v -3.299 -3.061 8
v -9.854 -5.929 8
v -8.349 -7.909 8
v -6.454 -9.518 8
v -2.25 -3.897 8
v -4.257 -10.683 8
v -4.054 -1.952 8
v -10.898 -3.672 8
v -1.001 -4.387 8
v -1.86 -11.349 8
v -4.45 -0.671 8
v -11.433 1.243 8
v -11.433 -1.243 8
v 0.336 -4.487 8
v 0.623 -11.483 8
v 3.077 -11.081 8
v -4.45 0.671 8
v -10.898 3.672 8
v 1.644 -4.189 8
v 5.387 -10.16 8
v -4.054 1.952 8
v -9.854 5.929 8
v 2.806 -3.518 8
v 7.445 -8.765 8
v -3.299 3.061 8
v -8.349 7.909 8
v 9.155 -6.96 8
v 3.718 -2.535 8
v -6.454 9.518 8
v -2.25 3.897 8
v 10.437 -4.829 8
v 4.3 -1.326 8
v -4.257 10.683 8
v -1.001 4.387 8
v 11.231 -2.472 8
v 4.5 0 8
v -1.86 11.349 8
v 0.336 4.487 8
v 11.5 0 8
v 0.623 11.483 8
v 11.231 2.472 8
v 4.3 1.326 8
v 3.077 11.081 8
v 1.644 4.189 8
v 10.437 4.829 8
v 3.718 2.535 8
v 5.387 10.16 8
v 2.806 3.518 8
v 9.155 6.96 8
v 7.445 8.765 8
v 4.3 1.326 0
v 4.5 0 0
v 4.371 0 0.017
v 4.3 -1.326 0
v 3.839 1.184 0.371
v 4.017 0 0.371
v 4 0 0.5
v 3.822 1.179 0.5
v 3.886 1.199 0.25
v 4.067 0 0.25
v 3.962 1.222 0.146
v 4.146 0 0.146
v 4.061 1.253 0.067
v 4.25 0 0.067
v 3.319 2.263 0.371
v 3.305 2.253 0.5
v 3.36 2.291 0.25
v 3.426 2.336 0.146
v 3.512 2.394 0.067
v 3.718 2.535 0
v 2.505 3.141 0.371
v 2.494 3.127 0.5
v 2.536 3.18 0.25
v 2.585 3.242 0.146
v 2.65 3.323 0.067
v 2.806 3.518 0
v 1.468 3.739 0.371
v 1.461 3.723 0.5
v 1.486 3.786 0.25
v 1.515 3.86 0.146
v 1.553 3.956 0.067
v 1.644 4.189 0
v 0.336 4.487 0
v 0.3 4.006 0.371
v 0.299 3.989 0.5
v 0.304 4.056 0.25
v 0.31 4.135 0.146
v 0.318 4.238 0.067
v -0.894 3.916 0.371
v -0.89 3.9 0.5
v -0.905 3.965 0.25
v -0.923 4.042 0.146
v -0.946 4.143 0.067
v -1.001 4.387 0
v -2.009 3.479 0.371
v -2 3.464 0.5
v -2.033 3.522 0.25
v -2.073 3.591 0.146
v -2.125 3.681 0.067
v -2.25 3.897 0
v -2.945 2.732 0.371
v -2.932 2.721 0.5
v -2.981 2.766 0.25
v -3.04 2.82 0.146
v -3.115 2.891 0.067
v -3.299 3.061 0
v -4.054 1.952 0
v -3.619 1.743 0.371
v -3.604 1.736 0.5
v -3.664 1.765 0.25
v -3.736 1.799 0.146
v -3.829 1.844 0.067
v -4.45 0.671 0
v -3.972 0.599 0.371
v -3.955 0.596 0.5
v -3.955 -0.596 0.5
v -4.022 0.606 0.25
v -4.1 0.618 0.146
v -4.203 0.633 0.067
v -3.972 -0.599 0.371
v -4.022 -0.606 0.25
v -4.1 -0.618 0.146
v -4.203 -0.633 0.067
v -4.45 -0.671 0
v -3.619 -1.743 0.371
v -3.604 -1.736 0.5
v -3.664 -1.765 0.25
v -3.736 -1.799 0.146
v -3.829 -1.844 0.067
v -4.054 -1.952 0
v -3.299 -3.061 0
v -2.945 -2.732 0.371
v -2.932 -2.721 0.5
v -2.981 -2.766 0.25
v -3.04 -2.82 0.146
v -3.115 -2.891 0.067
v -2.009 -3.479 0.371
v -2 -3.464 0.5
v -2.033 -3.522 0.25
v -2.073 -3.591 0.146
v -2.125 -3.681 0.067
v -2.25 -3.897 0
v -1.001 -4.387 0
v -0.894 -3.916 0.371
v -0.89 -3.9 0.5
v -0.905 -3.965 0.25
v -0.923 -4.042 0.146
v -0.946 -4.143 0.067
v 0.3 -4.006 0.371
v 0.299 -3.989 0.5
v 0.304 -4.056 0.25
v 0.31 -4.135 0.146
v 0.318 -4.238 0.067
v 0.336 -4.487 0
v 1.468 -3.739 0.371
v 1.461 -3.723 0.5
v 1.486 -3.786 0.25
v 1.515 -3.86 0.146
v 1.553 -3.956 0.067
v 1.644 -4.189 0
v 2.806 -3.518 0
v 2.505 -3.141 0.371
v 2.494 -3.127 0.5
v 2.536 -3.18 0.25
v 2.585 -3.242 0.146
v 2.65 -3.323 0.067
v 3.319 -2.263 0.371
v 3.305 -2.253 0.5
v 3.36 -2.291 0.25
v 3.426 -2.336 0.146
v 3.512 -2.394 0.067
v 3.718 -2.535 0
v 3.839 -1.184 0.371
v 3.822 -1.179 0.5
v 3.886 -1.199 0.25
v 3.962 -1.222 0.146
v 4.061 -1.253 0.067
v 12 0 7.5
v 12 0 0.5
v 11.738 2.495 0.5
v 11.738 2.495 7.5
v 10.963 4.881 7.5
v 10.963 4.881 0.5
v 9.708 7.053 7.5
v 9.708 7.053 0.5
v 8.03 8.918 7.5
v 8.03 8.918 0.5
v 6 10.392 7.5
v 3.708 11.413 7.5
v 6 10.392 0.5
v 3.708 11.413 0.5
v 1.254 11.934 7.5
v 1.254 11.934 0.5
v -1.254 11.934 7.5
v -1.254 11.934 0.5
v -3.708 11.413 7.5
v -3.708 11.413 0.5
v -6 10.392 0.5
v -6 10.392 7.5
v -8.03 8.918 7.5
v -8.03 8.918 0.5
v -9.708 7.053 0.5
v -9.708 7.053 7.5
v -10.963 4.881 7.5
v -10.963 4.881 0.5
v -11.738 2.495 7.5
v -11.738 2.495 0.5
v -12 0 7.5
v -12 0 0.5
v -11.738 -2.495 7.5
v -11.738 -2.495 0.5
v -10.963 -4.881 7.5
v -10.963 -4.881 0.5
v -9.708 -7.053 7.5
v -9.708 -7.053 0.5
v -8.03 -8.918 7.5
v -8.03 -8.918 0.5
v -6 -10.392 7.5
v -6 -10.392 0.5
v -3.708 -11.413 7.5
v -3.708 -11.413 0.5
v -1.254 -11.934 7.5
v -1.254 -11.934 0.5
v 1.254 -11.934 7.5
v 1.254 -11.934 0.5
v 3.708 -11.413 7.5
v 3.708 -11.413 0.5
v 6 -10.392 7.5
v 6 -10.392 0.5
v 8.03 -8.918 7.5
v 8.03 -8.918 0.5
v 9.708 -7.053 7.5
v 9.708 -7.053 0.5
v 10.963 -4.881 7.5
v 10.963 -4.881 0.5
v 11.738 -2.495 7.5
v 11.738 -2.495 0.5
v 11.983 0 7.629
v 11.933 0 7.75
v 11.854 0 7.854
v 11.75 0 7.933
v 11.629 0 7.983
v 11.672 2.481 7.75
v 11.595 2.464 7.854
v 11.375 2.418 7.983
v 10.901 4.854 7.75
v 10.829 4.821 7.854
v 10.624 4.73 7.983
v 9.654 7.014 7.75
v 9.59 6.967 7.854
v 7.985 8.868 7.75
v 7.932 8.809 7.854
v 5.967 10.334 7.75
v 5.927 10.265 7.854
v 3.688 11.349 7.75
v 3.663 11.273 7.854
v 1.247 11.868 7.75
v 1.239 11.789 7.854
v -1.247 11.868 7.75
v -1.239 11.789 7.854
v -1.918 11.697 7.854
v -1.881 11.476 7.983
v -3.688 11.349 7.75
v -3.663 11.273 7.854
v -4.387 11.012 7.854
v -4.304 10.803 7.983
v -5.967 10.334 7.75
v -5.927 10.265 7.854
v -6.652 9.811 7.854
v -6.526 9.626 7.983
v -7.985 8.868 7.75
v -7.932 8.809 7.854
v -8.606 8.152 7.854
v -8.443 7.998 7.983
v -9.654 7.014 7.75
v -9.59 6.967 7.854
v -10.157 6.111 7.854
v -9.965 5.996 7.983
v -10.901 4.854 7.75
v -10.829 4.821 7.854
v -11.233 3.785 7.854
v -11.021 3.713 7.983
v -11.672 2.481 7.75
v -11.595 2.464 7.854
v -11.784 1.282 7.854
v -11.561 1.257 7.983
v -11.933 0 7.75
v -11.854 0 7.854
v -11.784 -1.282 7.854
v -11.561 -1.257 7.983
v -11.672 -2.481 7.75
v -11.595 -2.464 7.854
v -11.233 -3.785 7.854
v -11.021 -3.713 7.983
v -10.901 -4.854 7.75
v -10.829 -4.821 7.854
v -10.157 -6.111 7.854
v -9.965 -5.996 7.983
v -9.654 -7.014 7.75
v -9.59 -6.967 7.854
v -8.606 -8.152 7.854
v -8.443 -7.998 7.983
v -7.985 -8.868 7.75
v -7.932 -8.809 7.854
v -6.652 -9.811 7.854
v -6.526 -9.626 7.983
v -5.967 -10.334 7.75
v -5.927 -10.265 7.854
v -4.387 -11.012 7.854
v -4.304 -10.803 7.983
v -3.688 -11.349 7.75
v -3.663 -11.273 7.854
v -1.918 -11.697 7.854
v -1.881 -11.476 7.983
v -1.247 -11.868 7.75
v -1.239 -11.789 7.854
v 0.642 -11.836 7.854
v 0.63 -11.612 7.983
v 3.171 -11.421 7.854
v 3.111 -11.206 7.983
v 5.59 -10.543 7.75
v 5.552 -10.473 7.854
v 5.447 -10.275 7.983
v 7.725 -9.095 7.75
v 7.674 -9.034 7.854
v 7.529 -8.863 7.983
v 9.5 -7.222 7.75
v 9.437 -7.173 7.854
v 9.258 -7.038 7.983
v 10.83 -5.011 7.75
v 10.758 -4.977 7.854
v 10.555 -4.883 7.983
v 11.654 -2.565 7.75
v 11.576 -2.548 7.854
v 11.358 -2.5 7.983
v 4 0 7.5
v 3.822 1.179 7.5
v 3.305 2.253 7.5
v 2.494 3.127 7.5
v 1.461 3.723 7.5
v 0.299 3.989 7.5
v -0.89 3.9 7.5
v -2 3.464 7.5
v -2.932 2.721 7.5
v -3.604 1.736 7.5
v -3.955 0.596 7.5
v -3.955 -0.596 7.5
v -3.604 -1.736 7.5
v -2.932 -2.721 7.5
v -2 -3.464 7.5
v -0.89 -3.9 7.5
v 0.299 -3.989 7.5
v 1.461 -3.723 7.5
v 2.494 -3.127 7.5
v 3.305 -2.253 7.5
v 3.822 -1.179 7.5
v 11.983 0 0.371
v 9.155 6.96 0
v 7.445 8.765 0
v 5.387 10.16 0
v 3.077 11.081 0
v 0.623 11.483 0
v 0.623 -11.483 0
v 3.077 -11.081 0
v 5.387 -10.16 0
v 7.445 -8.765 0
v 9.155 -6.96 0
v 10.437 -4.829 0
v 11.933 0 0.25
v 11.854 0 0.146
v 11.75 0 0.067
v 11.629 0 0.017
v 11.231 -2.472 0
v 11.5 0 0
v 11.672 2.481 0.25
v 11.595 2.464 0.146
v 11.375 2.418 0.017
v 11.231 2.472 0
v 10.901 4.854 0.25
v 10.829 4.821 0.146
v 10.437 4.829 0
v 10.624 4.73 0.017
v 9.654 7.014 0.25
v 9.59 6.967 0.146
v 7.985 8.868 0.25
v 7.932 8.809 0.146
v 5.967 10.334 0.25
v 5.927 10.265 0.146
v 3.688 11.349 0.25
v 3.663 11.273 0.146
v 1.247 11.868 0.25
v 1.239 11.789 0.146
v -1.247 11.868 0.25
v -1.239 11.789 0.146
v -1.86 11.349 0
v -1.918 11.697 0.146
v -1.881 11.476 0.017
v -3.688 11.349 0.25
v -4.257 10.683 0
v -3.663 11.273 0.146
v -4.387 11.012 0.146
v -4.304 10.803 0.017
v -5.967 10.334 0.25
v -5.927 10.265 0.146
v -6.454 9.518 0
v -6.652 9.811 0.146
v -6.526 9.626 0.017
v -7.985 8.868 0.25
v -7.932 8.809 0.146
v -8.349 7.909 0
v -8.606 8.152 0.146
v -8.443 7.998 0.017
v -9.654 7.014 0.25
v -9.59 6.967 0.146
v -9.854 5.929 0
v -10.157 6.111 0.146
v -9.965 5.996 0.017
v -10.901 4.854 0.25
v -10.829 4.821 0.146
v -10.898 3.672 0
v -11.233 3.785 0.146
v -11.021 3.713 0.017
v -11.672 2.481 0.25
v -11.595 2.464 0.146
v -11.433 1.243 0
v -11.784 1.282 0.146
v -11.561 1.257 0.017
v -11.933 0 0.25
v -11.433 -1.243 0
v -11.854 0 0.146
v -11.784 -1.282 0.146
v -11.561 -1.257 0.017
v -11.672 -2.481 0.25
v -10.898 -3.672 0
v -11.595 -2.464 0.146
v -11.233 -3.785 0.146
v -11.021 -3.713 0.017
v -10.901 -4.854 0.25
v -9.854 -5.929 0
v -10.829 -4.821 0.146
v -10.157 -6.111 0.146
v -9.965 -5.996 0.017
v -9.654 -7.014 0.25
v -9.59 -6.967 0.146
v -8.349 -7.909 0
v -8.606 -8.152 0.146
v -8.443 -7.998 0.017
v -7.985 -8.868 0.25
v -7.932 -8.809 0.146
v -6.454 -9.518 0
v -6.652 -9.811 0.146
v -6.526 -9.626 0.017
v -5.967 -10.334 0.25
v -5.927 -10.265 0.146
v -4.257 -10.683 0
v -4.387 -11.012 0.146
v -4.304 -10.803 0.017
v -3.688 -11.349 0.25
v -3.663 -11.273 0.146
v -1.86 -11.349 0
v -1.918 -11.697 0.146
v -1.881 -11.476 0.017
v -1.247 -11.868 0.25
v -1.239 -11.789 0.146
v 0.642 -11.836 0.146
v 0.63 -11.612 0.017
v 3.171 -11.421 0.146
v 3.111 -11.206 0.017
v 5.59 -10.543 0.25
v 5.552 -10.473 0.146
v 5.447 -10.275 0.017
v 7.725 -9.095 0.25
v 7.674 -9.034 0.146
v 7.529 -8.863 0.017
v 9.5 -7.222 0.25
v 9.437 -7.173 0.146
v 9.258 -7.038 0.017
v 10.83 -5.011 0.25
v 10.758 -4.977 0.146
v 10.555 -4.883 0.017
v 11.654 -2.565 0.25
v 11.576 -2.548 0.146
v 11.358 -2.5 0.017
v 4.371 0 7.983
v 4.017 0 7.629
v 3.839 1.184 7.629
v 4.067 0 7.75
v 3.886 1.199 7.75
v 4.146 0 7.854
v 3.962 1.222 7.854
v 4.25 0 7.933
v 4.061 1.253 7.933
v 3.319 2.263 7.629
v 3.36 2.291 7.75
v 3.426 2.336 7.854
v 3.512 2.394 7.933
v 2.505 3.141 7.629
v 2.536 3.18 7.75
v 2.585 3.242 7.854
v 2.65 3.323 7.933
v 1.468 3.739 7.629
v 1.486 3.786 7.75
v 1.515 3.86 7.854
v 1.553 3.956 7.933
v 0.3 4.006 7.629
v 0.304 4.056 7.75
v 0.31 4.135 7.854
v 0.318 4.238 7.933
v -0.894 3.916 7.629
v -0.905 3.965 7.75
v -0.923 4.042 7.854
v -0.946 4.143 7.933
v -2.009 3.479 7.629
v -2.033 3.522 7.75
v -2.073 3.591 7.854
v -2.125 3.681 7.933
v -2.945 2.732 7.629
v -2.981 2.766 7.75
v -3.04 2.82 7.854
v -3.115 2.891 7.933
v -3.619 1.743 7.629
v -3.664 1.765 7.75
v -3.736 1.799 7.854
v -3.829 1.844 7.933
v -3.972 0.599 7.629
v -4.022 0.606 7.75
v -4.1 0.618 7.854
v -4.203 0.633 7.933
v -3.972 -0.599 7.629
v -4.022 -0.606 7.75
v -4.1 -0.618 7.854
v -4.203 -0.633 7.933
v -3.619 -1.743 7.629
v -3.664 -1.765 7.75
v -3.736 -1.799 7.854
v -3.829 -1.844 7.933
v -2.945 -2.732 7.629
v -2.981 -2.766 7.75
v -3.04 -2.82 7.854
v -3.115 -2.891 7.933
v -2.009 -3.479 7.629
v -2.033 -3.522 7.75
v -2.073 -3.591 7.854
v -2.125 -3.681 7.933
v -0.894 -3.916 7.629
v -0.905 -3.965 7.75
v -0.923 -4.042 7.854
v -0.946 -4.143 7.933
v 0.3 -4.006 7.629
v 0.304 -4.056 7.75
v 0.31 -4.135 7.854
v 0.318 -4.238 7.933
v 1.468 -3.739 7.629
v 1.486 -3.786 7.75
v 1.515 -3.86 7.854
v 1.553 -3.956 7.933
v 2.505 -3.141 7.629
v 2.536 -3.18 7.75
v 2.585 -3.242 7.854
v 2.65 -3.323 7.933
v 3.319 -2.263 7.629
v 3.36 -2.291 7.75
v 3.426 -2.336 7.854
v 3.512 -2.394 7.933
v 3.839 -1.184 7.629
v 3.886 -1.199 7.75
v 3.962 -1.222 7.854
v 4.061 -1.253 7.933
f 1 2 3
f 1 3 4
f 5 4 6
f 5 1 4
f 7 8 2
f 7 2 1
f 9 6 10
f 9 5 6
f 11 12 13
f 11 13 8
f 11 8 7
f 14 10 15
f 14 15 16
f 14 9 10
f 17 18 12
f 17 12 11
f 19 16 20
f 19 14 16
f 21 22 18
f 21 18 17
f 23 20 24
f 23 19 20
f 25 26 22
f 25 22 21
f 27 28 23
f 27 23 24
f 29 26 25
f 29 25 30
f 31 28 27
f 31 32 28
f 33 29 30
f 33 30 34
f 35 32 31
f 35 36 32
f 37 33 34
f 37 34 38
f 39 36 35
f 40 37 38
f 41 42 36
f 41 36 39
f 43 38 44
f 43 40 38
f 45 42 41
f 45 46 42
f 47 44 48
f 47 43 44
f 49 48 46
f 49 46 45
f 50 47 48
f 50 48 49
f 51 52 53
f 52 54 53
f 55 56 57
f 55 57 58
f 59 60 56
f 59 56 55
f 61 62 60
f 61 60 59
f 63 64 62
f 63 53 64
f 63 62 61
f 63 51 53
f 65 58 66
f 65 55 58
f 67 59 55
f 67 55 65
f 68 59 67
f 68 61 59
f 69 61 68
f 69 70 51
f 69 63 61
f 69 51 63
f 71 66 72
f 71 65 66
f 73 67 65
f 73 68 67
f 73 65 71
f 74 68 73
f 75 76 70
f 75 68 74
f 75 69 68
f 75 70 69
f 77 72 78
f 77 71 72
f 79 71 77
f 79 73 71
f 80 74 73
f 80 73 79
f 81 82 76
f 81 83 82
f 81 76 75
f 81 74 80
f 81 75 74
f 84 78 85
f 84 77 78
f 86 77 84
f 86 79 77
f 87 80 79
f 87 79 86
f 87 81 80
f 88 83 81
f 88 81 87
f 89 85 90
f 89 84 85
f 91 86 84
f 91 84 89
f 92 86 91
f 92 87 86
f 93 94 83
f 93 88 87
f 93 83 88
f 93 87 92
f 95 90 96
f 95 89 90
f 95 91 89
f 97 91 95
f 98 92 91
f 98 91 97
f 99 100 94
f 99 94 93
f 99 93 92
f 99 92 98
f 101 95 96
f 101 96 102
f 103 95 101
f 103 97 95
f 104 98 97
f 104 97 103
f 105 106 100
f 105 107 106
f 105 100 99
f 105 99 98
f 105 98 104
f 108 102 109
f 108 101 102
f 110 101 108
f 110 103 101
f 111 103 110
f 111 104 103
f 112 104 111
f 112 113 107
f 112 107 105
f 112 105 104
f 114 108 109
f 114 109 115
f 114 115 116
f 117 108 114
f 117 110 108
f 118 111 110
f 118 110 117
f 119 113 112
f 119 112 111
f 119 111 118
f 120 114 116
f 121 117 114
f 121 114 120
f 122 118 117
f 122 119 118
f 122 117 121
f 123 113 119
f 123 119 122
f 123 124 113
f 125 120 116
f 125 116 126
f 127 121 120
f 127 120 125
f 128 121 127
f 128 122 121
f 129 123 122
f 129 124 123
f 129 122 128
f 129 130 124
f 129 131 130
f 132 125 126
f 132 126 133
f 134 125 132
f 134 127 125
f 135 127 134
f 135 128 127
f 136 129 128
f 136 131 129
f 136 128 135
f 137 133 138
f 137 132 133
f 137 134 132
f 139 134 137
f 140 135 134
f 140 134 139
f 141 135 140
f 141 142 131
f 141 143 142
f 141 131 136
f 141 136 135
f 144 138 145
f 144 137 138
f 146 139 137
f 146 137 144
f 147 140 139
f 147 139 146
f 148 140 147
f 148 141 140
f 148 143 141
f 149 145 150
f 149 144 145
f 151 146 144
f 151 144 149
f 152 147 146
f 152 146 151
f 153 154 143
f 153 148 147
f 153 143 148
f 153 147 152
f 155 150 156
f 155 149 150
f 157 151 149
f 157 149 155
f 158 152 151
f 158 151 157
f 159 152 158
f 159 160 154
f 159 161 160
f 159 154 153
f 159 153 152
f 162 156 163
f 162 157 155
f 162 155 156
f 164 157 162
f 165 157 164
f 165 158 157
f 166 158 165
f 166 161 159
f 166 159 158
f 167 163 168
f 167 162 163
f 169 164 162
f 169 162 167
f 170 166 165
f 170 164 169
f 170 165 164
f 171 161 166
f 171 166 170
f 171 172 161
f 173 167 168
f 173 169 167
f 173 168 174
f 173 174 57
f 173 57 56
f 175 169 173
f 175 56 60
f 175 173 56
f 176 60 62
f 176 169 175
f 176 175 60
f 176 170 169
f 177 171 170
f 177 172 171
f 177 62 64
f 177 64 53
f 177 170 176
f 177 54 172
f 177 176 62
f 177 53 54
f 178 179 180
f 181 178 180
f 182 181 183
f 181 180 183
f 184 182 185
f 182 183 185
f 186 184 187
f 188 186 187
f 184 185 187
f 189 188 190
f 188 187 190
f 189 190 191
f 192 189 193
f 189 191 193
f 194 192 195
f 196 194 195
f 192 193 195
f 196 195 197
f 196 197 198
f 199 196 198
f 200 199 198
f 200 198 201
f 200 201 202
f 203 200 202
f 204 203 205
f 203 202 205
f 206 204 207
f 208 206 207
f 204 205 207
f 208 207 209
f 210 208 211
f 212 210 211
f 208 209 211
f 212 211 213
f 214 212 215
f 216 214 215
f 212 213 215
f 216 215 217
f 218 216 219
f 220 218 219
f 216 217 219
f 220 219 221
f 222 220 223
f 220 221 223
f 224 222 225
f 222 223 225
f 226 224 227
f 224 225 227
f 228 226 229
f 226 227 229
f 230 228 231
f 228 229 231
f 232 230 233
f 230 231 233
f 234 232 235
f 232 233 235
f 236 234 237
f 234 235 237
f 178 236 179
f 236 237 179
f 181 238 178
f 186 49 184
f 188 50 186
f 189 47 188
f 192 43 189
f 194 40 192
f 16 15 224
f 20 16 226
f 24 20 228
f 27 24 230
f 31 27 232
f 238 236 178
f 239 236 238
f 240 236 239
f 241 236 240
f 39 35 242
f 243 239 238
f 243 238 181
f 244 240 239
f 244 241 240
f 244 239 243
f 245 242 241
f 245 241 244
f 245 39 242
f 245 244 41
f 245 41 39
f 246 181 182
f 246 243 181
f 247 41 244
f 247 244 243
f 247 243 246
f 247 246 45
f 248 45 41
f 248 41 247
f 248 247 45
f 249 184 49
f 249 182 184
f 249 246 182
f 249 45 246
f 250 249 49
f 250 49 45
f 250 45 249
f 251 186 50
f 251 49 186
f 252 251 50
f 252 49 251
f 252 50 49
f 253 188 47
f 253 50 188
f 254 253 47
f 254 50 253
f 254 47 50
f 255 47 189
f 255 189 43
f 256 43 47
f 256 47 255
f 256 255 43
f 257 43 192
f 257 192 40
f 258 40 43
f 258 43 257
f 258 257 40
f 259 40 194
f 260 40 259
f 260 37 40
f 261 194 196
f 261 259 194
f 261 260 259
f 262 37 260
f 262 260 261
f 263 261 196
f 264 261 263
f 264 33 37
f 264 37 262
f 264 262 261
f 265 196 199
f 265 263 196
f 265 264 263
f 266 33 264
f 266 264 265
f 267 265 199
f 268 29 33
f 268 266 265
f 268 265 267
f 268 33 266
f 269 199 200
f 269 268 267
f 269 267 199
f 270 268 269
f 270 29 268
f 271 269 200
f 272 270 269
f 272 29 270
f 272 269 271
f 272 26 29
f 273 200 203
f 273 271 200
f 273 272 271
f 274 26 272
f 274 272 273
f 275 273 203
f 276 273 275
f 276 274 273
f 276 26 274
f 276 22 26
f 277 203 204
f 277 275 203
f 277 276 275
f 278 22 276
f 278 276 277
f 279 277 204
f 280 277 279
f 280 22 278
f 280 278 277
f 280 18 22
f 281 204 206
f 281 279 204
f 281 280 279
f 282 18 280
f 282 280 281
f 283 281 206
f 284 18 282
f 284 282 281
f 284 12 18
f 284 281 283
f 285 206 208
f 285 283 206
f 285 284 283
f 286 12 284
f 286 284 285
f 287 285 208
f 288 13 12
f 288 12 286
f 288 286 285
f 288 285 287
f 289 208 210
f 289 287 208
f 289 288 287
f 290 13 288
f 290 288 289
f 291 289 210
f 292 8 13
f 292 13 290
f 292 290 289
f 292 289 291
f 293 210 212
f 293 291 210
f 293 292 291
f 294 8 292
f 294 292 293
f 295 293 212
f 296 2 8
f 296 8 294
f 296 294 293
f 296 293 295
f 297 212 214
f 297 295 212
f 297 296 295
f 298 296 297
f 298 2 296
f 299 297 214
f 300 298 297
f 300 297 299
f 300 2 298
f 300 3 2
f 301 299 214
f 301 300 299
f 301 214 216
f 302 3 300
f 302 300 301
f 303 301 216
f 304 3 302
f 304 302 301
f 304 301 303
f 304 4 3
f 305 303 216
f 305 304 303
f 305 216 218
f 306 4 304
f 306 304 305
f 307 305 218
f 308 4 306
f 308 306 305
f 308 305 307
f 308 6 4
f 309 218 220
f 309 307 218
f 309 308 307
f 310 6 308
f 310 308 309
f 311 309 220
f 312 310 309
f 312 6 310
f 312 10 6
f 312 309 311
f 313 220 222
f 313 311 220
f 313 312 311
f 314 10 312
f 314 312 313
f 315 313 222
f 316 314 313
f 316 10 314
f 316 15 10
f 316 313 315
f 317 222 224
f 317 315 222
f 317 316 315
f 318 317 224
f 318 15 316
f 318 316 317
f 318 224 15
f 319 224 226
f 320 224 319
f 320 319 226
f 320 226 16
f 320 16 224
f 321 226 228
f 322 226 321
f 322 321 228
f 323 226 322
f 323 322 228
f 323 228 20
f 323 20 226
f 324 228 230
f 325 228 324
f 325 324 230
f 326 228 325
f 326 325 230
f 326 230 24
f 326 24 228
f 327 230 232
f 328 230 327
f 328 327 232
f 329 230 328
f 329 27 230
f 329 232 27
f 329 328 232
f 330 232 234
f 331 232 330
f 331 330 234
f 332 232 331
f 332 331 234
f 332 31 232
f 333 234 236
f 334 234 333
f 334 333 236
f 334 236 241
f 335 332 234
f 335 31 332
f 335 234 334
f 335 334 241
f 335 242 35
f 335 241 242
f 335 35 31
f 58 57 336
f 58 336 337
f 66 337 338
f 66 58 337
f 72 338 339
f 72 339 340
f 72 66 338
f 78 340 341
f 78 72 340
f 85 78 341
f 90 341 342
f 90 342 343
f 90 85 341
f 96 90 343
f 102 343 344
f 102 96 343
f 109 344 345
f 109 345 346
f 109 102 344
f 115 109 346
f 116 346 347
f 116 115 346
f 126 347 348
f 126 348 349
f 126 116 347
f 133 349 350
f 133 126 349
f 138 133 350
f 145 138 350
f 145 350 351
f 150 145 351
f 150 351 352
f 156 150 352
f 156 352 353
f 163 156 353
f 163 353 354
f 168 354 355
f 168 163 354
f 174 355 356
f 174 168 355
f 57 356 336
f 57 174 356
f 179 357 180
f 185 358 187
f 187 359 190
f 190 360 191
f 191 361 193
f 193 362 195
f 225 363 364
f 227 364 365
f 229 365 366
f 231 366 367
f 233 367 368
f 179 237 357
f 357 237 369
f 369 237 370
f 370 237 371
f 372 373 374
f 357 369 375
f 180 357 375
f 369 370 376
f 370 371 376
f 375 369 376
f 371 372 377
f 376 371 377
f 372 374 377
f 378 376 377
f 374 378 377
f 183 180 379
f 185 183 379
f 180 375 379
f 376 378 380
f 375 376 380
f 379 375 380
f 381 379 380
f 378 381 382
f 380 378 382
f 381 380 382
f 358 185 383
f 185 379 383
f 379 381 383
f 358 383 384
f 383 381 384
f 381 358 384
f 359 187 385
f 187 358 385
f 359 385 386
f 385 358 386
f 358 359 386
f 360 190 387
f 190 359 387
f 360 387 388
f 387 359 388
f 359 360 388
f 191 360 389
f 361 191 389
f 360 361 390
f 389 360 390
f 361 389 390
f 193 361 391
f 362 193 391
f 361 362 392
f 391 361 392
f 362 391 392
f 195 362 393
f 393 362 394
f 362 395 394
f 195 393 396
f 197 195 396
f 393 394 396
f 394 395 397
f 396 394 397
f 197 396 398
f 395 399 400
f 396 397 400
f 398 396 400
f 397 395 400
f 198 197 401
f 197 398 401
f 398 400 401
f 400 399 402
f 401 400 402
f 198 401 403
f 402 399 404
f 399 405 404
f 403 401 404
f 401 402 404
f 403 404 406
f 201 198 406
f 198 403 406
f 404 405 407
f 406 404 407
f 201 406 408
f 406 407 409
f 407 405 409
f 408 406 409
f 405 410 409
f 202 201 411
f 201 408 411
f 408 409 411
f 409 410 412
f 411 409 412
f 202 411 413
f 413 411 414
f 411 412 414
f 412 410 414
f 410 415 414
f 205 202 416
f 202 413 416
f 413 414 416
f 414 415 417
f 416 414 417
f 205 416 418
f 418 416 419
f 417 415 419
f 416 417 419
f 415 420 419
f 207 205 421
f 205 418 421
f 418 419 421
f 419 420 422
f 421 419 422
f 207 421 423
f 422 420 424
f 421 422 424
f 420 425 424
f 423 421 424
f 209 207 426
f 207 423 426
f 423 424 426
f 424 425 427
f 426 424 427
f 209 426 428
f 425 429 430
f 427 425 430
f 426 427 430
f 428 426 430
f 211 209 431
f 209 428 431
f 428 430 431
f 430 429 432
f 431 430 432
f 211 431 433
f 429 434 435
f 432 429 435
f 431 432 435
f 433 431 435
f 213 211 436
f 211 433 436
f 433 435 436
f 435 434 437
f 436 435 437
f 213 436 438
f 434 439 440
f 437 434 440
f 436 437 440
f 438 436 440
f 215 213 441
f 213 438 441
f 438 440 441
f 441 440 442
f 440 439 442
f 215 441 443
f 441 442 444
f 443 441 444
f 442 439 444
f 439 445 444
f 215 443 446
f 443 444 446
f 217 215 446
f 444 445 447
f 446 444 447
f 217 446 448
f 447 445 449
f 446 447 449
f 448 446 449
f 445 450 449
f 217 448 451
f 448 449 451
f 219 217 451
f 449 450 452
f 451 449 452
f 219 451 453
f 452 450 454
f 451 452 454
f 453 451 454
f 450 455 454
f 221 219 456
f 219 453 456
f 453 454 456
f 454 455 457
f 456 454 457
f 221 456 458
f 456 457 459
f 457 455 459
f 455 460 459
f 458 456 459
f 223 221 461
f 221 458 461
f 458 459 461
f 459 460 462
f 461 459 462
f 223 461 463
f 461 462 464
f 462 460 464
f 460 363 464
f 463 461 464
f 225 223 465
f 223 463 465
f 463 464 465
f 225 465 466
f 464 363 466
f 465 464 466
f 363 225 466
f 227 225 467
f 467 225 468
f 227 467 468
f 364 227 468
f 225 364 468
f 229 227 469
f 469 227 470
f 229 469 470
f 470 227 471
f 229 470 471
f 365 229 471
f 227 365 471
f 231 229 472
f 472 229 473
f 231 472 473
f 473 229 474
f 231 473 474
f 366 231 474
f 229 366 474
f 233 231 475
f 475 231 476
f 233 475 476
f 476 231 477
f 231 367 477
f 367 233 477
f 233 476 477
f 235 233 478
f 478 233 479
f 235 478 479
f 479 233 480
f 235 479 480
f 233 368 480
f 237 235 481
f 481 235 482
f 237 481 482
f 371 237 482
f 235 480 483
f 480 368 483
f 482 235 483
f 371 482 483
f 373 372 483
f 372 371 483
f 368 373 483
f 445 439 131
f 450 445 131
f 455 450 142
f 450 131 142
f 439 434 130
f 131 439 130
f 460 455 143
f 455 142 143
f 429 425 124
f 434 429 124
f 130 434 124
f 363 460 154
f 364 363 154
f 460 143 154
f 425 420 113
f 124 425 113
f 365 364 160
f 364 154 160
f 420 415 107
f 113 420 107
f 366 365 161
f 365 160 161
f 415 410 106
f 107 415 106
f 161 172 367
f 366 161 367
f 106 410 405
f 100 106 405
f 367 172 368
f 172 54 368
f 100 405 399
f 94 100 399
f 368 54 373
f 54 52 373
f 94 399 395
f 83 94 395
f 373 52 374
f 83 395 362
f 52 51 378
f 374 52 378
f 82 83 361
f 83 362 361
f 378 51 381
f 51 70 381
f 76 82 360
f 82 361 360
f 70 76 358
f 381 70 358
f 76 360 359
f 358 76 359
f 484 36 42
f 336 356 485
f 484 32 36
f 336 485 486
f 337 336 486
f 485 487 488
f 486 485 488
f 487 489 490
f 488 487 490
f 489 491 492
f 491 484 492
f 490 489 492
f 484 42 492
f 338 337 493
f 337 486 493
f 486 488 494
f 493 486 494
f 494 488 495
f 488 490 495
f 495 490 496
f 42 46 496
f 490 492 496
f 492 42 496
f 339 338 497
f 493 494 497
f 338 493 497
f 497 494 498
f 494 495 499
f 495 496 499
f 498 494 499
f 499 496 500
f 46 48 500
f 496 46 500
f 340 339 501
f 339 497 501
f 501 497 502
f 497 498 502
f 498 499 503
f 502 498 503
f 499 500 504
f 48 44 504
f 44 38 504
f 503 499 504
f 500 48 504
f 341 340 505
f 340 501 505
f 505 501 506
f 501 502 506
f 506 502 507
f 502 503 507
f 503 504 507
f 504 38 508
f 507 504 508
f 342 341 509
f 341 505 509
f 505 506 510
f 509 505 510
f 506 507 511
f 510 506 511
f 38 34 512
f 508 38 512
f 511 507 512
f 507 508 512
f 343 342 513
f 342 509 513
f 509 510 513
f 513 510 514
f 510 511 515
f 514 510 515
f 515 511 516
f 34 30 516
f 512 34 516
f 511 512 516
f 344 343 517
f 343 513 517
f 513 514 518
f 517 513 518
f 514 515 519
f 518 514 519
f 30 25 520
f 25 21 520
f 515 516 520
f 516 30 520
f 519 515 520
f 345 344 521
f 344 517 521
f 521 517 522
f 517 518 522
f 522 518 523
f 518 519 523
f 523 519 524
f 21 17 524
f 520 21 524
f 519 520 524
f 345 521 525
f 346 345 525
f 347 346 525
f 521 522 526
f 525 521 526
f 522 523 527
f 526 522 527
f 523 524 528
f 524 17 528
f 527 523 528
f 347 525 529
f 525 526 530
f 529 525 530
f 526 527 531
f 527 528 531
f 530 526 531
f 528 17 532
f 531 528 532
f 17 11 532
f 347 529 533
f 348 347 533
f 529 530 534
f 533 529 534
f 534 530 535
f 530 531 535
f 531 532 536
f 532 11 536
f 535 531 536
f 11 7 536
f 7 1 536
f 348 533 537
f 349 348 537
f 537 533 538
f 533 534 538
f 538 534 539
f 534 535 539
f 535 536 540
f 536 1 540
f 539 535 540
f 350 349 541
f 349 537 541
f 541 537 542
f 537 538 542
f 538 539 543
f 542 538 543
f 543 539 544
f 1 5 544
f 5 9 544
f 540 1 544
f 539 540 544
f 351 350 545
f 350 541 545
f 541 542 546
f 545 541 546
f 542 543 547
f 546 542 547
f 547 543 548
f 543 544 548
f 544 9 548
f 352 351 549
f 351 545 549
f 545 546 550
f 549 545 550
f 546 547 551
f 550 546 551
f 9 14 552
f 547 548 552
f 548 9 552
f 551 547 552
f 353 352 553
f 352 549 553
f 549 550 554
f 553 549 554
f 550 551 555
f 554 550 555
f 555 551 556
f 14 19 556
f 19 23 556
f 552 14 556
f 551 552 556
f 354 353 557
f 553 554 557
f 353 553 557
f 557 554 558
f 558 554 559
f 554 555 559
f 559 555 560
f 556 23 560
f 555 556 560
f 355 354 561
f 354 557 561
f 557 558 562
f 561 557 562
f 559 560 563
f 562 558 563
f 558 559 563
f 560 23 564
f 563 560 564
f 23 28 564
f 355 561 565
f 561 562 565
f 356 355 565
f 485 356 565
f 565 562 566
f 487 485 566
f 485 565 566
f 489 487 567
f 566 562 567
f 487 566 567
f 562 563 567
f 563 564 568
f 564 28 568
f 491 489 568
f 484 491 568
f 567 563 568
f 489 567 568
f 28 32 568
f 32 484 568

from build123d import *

# Parameters (mm, degrees)
CROQUIS1_R              = 12
CROQUIS1_R_2            = 4
SALIENTE_EXTRUIR1_DEPTH = 8
REDONDEO1_R             = 0.5


with BuildPart() as part:
    # Croquis1 → Saliente-Extruir1 (new body)
    with BuildSketch(Plane.XY):
        Circle(CROQUIS1_R)
        Circle(CROQUIS1_R_2, mode=Mode.SUBTRACT)
    extrude(amount=SALIENTE_EXTRUIR1_DEPTH)

    # Redondeo1
    redondeo1_edges = [part.edges().sort_by_distance(p)[0] for p in [
        (-12, 0, 0),
        (-12, 0, 8),
        (-4, 0, 0),
        (-4, 0, 8),
    ]]
    fillet(redondeo1_edges, radius=REDONDEO1_R)


solid = part.part
